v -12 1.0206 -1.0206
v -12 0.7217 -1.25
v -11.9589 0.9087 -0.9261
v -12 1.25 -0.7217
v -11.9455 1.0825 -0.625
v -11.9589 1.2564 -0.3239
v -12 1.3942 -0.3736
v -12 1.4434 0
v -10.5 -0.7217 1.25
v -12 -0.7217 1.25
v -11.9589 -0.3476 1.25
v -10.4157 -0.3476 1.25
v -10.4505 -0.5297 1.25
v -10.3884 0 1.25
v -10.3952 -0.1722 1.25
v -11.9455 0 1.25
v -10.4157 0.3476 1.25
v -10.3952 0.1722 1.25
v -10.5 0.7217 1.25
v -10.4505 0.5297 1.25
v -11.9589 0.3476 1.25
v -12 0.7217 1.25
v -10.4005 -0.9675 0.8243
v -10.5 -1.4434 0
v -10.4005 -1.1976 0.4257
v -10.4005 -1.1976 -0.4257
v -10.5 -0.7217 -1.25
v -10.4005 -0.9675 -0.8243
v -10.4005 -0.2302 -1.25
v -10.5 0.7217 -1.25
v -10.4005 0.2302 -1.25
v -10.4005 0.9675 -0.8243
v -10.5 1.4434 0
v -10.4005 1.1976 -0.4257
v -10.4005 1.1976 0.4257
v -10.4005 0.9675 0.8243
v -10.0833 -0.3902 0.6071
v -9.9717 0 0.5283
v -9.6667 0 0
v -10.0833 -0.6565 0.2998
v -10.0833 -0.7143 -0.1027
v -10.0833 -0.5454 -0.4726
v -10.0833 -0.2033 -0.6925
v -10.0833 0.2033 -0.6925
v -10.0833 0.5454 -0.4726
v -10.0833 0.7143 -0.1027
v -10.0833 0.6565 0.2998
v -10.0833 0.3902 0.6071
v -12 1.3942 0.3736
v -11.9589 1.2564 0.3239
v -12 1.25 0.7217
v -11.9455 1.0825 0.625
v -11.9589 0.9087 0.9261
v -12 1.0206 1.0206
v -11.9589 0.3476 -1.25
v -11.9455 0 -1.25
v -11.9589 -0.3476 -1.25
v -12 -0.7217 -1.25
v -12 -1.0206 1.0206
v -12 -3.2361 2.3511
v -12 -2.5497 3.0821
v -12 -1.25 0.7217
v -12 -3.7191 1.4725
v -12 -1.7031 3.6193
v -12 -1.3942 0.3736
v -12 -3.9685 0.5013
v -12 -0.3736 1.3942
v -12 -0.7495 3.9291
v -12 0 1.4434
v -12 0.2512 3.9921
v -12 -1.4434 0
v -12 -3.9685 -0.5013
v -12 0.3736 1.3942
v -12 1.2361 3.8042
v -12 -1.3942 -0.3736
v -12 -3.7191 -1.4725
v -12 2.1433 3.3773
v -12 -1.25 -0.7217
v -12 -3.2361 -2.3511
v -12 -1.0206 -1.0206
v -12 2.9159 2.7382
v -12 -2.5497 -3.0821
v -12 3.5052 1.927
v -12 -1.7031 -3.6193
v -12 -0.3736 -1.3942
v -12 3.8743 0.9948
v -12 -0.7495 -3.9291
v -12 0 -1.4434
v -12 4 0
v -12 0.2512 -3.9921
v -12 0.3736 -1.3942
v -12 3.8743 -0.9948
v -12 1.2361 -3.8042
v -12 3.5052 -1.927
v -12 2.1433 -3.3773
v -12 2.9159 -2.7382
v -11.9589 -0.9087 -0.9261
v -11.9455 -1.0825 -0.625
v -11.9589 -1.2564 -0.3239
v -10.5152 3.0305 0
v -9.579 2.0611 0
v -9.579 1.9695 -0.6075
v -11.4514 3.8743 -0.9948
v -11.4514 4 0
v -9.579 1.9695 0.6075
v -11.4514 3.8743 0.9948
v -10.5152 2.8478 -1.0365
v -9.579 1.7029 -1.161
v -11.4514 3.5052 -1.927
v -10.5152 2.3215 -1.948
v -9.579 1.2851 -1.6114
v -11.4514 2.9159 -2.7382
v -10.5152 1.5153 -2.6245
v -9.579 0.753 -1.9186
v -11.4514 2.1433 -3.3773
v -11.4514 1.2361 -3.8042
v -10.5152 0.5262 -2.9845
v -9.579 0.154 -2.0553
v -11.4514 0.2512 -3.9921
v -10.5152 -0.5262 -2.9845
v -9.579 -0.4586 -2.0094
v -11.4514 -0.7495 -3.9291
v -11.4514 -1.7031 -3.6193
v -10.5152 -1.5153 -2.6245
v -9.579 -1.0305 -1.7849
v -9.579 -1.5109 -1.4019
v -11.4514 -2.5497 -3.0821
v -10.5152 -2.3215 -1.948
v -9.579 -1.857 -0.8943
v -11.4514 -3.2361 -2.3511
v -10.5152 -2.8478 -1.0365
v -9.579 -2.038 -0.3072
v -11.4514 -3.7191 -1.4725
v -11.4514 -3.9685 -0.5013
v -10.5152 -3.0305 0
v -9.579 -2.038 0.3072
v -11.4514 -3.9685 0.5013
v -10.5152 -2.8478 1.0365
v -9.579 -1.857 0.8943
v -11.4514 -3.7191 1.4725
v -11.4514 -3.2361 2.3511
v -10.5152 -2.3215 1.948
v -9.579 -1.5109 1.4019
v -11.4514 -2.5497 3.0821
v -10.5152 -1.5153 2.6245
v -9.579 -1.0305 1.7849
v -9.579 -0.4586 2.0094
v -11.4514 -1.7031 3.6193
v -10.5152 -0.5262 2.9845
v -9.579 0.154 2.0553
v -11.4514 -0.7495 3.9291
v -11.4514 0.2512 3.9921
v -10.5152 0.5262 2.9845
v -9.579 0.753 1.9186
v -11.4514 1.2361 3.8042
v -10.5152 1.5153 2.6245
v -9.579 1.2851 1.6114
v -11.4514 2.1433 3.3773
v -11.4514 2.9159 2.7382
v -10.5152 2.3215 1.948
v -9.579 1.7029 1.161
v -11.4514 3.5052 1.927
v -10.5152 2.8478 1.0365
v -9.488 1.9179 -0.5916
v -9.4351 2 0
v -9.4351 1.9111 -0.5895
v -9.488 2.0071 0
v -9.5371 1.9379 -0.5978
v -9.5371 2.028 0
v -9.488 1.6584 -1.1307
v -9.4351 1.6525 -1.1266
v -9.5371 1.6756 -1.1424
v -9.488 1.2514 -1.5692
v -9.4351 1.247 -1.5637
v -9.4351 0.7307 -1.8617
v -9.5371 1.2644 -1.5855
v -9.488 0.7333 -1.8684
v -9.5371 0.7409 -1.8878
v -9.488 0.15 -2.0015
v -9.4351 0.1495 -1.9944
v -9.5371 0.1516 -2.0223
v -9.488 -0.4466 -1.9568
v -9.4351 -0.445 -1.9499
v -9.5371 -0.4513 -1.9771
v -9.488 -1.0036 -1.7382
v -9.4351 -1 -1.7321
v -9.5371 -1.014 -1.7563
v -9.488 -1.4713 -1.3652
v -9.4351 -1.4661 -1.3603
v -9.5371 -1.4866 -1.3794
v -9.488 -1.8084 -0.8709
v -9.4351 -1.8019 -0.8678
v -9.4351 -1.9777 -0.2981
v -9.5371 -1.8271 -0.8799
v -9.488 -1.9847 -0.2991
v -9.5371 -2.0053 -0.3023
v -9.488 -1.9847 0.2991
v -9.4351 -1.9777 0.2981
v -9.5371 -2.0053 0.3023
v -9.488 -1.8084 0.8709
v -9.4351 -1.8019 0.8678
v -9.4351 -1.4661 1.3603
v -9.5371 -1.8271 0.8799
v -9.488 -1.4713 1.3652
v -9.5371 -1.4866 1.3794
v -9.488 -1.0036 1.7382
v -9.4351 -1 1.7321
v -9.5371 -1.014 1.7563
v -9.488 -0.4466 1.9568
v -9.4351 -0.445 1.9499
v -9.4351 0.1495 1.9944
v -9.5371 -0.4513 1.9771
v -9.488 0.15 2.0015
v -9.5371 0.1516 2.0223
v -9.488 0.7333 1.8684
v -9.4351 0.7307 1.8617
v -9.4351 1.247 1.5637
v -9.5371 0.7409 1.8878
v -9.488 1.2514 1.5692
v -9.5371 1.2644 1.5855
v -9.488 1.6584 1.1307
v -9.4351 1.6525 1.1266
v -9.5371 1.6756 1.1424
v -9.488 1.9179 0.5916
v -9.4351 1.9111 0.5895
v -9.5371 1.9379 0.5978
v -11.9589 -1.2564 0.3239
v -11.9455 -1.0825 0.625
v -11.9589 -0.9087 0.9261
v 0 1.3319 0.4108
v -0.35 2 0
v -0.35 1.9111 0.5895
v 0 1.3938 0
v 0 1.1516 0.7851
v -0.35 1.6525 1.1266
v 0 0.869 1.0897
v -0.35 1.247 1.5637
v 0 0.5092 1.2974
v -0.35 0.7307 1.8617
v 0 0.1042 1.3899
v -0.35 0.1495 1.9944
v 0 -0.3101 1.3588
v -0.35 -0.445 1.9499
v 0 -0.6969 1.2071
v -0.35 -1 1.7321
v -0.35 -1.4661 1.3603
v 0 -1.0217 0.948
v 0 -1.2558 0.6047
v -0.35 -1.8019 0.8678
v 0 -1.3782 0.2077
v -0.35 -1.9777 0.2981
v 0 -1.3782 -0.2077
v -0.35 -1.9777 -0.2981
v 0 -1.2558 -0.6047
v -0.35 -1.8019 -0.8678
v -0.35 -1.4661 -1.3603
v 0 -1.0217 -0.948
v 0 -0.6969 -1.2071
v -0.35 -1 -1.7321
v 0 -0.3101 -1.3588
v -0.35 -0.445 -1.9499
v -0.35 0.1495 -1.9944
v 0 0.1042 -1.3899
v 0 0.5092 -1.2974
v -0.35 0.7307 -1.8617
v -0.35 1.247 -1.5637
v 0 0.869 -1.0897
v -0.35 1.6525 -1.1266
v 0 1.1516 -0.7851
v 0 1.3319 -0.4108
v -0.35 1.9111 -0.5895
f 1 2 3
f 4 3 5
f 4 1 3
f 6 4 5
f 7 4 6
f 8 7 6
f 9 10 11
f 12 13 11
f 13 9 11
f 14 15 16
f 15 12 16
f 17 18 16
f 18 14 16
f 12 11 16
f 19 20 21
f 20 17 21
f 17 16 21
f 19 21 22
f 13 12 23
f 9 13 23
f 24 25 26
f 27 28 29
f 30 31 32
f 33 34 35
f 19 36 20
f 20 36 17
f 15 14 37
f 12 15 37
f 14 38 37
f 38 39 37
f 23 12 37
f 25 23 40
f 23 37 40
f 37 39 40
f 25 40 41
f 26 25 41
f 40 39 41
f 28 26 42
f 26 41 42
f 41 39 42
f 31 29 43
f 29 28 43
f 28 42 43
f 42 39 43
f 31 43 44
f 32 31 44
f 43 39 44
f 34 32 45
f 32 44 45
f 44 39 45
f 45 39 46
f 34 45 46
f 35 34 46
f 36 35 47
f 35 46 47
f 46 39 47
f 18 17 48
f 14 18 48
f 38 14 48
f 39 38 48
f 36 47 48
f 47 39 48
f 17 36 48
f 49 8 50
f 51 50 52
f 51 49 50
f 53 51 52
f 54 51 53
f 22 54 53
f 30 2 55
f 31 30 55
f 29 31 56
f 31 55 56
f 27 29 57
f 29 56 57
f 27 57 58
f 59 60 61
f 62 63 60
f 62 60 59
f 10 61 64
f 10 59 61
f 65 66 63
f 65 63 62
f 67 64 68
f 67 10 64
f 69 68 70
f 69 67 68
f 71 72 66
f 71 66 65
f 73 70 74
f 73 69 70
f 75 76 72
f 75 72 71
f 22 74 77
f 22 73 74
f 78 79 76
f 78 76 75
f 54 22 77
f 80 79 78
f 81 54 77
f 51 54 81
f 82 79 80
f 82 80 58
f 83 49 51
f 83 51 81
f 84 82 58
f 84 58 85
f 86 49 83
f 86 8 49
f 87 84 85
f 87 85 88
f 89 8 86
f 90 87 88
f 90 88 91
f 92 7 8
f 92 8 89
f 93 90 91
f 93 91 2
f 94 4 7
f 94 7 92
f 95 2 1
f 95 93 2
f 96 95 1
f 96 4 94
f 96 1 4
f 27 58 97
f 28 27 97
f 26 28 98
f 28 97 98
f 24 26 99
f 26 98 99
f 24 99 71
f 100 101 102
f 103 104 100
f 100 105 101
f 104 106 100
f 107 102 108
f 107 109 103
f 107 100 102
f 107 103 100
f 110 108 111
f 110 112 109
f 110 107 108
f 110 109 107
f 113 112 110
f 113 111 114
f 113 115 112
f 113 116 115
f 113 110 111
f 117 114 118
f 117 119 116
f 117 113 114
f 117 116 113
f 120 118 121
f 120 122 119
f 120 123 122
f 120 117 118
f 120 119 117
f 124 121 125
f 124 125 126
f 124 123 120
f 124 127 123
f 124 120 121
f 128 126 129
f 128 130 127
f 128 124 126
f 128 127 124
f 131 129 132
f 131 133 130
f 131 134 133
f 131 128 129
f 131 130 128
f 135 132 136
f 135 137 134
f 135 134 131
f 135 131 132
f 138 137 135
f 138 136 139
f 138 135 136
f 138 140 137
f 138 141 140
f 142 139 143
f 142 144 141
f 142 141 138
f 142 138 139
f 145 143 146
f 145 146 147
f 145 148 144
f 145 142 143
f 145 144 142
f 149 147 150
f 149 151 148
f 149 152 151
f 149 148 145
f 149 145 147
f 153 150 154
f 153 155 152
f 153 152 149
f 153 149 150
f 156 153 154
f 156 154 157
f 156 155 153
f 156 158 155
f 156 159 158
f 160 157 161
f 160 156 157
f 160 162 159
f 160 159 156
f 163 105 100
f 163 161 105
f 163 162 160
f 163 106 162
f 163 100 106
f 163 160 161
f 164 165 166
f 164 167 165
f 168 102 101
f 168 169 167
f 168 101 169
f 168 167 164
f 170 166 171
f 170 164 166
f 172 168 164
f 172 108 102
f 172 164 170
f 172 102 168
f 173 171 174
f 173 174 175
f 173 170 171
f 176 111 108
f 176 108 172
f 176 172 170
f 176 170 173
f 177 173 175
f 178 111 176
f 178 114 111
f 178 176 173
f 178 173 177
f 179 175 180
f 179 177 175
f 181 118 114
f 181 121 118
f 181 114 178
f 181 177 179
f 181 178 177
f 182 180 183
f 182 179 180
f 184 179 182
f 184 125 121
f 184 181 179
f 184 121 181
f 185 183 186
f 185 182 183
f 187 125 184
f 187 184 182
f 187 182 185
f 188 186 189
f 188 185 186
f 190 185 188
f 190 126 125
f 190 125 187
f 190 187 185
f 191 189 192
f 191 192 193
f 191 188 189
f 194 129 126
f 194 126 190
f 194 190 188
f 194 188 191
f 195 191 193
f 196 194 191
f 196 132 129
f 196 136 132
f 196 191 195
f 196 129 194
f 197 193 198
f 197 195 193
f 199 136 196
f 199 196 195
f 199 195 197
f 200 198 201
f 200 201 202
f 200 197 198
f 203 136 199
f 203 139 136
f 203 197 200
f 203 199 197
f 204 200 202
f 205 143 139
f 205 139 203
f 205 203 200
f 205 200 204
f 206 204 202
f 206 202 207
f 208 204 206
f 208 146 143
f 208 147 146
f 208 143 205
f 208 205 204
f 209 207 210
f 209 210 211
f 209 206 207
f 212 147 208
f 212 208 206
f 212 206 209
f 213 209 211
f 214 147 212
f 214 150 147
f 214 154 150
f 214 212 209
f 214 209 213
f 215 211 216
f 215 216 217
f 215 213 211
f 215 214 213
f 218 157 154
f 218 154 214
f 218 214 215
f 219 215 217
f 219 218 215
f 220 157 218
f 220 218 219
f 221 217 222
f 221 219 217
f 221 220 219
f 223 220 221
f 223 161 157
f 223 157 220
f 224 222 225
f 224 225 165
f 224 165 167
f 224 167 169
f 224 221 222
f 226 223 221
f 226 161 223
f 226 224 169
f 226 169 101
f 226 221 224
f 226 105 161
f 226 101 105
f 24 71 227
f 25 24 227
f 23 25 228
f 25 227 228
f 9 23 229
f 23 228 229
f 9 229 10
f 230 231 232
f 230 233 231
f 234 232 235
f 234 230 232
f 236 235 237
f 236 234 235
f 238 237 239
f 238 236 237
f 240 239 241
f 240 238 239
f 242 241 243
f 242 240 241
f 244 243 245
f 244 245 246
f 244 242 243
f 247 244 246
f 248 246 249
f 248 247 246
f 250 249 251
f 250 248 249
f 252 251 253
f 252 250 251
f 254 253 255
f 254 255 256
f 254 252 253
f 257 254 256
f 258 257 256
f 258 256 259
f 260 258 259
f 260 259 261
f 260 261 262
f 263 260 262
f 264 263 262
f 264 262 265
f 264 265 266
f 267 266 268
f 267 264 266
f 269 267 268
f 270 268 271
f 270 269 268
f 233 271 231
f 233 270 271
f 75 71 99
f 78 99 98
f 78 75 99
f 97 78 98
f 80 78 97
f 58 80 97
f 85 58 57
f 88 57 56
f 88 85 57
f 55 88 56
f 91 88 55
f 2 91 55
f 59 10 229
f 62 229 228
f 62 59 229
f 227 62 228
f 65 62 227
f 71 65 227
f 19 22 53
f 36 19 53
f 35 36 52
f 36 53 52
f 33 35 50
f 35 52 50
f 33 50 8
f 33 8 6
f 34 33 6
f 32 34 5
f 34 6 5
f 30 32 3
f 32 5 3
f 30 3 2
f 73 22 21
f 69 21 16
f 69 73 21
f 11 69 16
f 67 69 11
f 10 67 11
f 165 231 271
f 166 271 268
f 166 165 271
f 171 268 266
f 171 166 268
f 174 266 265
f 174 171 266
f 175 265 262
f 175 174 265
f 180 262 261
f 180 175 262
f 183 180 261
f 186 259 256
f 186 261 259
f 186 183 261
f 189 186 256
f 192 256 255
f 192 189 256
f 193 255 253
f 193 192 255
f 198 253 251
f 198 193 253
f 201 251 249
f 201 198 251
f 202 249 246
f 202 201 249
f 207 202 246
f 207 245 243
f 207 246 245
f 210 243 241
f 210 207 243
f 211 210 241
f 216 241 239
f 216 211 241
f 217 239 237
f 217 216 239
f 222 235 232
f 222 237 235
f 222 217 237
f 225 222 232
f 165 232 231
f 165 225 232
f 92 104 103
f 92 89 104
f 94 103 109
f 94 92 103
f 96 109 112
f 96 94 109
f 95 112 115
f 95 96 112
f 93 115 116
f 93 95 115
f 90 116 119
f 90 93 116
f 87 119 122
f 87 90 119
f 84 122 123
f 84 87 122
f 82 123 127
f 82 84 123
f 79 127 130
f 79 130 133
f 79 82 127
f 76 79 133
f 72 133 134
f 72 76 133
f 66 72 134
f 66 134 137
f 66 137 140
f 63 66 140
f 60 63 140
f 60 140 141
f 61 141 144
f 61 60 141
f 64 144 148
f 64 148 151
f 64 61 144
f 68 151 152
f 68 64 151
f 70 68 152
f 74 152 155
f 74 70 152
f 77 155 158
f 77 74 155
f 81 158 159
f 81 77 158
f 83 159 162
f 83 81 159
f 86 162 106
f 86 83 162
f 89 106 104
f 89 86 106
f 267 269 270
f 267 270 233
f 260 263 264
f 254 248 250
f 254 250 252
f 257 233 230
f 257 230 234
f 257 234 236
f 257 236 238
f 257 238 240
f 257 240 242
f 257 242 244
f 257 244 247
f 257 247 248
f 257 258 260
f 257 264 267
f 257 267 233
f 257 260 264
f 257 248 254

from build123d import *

# Parameters (mm, degrees)
CUT_EXTRUDE_1_DEPTH = 2.58


with BuildPart() as part:
    # 草图1 → 旋转1 (revolve)
    with BuildSketch(Plane.XY):
        with BuildLine():
            Line((0, 2), (-9.435105037, 2))
            ThreePointArc((-9.435105037, 2), (-9.513251262, 2.015899029), (-9.578972997, 2.061068326))
            Line((-9.578972997, 2.061068326), (-11.45137755, 4))
            Line((-11.45137755, 4), (-12, 4))
            Line((-12, 4), (-12, 0))
            Line((-12, 0), (0, 0))
            Line((0, 0), (0, 2))
        make_face()
    revolve(axis=Axis((0, 0, 0), (-1, 0, 0)))

    # 草图2 → 切除-拉伸1 (cut)
    with BuildSketch(Plane.ZY.offset(12)):
        Polygon((0, 1.443375673), (-1.25, 0.721687836), (-1.25, -0.721687836), (0, -1.443375673), (1.25, -0.721687836), (1.25, 0.721687836), align=None)
    extrude(amount=-CUT_EXTRUDE_1_DEPTH, mode=Mode.SUBTRACT)

    # 草图6 → 旋转2 (revolve)
    with BuildSketch(Plane.XY):
        Polygon((-10.5, 1.443375673), (-9.666666667, 0), (-9.05, 0), (-9.05, 1.443375673), align=None)
    revolve(axis=Axis((-12, 0, 0), (1, 0, 0)))

    # 草图7 → 切除-旋转2 (revolve, cut)
    with BuildSketch(Plane.XY):
        Polygon((-12, 1.443375673), (-12, 0), (-11.593, 0), align=None)
    revolve(axis=Axis((-12, 0, 0), (1, 0, 0)), mode=Mode.SUBTRACT)

    # 草图4 → 切除-旋转1 (revolve, cut)
    with BuildSketch(Plane.XY):
        Polygon((-0.35, 2), (0, 1.393782217), (0.35, 2), align=None)
    revolve(axis=Axis((-0.35, 0, 0), (1, 0, 0)), mode=Mode.SUBTRACT)


solid = part.part
